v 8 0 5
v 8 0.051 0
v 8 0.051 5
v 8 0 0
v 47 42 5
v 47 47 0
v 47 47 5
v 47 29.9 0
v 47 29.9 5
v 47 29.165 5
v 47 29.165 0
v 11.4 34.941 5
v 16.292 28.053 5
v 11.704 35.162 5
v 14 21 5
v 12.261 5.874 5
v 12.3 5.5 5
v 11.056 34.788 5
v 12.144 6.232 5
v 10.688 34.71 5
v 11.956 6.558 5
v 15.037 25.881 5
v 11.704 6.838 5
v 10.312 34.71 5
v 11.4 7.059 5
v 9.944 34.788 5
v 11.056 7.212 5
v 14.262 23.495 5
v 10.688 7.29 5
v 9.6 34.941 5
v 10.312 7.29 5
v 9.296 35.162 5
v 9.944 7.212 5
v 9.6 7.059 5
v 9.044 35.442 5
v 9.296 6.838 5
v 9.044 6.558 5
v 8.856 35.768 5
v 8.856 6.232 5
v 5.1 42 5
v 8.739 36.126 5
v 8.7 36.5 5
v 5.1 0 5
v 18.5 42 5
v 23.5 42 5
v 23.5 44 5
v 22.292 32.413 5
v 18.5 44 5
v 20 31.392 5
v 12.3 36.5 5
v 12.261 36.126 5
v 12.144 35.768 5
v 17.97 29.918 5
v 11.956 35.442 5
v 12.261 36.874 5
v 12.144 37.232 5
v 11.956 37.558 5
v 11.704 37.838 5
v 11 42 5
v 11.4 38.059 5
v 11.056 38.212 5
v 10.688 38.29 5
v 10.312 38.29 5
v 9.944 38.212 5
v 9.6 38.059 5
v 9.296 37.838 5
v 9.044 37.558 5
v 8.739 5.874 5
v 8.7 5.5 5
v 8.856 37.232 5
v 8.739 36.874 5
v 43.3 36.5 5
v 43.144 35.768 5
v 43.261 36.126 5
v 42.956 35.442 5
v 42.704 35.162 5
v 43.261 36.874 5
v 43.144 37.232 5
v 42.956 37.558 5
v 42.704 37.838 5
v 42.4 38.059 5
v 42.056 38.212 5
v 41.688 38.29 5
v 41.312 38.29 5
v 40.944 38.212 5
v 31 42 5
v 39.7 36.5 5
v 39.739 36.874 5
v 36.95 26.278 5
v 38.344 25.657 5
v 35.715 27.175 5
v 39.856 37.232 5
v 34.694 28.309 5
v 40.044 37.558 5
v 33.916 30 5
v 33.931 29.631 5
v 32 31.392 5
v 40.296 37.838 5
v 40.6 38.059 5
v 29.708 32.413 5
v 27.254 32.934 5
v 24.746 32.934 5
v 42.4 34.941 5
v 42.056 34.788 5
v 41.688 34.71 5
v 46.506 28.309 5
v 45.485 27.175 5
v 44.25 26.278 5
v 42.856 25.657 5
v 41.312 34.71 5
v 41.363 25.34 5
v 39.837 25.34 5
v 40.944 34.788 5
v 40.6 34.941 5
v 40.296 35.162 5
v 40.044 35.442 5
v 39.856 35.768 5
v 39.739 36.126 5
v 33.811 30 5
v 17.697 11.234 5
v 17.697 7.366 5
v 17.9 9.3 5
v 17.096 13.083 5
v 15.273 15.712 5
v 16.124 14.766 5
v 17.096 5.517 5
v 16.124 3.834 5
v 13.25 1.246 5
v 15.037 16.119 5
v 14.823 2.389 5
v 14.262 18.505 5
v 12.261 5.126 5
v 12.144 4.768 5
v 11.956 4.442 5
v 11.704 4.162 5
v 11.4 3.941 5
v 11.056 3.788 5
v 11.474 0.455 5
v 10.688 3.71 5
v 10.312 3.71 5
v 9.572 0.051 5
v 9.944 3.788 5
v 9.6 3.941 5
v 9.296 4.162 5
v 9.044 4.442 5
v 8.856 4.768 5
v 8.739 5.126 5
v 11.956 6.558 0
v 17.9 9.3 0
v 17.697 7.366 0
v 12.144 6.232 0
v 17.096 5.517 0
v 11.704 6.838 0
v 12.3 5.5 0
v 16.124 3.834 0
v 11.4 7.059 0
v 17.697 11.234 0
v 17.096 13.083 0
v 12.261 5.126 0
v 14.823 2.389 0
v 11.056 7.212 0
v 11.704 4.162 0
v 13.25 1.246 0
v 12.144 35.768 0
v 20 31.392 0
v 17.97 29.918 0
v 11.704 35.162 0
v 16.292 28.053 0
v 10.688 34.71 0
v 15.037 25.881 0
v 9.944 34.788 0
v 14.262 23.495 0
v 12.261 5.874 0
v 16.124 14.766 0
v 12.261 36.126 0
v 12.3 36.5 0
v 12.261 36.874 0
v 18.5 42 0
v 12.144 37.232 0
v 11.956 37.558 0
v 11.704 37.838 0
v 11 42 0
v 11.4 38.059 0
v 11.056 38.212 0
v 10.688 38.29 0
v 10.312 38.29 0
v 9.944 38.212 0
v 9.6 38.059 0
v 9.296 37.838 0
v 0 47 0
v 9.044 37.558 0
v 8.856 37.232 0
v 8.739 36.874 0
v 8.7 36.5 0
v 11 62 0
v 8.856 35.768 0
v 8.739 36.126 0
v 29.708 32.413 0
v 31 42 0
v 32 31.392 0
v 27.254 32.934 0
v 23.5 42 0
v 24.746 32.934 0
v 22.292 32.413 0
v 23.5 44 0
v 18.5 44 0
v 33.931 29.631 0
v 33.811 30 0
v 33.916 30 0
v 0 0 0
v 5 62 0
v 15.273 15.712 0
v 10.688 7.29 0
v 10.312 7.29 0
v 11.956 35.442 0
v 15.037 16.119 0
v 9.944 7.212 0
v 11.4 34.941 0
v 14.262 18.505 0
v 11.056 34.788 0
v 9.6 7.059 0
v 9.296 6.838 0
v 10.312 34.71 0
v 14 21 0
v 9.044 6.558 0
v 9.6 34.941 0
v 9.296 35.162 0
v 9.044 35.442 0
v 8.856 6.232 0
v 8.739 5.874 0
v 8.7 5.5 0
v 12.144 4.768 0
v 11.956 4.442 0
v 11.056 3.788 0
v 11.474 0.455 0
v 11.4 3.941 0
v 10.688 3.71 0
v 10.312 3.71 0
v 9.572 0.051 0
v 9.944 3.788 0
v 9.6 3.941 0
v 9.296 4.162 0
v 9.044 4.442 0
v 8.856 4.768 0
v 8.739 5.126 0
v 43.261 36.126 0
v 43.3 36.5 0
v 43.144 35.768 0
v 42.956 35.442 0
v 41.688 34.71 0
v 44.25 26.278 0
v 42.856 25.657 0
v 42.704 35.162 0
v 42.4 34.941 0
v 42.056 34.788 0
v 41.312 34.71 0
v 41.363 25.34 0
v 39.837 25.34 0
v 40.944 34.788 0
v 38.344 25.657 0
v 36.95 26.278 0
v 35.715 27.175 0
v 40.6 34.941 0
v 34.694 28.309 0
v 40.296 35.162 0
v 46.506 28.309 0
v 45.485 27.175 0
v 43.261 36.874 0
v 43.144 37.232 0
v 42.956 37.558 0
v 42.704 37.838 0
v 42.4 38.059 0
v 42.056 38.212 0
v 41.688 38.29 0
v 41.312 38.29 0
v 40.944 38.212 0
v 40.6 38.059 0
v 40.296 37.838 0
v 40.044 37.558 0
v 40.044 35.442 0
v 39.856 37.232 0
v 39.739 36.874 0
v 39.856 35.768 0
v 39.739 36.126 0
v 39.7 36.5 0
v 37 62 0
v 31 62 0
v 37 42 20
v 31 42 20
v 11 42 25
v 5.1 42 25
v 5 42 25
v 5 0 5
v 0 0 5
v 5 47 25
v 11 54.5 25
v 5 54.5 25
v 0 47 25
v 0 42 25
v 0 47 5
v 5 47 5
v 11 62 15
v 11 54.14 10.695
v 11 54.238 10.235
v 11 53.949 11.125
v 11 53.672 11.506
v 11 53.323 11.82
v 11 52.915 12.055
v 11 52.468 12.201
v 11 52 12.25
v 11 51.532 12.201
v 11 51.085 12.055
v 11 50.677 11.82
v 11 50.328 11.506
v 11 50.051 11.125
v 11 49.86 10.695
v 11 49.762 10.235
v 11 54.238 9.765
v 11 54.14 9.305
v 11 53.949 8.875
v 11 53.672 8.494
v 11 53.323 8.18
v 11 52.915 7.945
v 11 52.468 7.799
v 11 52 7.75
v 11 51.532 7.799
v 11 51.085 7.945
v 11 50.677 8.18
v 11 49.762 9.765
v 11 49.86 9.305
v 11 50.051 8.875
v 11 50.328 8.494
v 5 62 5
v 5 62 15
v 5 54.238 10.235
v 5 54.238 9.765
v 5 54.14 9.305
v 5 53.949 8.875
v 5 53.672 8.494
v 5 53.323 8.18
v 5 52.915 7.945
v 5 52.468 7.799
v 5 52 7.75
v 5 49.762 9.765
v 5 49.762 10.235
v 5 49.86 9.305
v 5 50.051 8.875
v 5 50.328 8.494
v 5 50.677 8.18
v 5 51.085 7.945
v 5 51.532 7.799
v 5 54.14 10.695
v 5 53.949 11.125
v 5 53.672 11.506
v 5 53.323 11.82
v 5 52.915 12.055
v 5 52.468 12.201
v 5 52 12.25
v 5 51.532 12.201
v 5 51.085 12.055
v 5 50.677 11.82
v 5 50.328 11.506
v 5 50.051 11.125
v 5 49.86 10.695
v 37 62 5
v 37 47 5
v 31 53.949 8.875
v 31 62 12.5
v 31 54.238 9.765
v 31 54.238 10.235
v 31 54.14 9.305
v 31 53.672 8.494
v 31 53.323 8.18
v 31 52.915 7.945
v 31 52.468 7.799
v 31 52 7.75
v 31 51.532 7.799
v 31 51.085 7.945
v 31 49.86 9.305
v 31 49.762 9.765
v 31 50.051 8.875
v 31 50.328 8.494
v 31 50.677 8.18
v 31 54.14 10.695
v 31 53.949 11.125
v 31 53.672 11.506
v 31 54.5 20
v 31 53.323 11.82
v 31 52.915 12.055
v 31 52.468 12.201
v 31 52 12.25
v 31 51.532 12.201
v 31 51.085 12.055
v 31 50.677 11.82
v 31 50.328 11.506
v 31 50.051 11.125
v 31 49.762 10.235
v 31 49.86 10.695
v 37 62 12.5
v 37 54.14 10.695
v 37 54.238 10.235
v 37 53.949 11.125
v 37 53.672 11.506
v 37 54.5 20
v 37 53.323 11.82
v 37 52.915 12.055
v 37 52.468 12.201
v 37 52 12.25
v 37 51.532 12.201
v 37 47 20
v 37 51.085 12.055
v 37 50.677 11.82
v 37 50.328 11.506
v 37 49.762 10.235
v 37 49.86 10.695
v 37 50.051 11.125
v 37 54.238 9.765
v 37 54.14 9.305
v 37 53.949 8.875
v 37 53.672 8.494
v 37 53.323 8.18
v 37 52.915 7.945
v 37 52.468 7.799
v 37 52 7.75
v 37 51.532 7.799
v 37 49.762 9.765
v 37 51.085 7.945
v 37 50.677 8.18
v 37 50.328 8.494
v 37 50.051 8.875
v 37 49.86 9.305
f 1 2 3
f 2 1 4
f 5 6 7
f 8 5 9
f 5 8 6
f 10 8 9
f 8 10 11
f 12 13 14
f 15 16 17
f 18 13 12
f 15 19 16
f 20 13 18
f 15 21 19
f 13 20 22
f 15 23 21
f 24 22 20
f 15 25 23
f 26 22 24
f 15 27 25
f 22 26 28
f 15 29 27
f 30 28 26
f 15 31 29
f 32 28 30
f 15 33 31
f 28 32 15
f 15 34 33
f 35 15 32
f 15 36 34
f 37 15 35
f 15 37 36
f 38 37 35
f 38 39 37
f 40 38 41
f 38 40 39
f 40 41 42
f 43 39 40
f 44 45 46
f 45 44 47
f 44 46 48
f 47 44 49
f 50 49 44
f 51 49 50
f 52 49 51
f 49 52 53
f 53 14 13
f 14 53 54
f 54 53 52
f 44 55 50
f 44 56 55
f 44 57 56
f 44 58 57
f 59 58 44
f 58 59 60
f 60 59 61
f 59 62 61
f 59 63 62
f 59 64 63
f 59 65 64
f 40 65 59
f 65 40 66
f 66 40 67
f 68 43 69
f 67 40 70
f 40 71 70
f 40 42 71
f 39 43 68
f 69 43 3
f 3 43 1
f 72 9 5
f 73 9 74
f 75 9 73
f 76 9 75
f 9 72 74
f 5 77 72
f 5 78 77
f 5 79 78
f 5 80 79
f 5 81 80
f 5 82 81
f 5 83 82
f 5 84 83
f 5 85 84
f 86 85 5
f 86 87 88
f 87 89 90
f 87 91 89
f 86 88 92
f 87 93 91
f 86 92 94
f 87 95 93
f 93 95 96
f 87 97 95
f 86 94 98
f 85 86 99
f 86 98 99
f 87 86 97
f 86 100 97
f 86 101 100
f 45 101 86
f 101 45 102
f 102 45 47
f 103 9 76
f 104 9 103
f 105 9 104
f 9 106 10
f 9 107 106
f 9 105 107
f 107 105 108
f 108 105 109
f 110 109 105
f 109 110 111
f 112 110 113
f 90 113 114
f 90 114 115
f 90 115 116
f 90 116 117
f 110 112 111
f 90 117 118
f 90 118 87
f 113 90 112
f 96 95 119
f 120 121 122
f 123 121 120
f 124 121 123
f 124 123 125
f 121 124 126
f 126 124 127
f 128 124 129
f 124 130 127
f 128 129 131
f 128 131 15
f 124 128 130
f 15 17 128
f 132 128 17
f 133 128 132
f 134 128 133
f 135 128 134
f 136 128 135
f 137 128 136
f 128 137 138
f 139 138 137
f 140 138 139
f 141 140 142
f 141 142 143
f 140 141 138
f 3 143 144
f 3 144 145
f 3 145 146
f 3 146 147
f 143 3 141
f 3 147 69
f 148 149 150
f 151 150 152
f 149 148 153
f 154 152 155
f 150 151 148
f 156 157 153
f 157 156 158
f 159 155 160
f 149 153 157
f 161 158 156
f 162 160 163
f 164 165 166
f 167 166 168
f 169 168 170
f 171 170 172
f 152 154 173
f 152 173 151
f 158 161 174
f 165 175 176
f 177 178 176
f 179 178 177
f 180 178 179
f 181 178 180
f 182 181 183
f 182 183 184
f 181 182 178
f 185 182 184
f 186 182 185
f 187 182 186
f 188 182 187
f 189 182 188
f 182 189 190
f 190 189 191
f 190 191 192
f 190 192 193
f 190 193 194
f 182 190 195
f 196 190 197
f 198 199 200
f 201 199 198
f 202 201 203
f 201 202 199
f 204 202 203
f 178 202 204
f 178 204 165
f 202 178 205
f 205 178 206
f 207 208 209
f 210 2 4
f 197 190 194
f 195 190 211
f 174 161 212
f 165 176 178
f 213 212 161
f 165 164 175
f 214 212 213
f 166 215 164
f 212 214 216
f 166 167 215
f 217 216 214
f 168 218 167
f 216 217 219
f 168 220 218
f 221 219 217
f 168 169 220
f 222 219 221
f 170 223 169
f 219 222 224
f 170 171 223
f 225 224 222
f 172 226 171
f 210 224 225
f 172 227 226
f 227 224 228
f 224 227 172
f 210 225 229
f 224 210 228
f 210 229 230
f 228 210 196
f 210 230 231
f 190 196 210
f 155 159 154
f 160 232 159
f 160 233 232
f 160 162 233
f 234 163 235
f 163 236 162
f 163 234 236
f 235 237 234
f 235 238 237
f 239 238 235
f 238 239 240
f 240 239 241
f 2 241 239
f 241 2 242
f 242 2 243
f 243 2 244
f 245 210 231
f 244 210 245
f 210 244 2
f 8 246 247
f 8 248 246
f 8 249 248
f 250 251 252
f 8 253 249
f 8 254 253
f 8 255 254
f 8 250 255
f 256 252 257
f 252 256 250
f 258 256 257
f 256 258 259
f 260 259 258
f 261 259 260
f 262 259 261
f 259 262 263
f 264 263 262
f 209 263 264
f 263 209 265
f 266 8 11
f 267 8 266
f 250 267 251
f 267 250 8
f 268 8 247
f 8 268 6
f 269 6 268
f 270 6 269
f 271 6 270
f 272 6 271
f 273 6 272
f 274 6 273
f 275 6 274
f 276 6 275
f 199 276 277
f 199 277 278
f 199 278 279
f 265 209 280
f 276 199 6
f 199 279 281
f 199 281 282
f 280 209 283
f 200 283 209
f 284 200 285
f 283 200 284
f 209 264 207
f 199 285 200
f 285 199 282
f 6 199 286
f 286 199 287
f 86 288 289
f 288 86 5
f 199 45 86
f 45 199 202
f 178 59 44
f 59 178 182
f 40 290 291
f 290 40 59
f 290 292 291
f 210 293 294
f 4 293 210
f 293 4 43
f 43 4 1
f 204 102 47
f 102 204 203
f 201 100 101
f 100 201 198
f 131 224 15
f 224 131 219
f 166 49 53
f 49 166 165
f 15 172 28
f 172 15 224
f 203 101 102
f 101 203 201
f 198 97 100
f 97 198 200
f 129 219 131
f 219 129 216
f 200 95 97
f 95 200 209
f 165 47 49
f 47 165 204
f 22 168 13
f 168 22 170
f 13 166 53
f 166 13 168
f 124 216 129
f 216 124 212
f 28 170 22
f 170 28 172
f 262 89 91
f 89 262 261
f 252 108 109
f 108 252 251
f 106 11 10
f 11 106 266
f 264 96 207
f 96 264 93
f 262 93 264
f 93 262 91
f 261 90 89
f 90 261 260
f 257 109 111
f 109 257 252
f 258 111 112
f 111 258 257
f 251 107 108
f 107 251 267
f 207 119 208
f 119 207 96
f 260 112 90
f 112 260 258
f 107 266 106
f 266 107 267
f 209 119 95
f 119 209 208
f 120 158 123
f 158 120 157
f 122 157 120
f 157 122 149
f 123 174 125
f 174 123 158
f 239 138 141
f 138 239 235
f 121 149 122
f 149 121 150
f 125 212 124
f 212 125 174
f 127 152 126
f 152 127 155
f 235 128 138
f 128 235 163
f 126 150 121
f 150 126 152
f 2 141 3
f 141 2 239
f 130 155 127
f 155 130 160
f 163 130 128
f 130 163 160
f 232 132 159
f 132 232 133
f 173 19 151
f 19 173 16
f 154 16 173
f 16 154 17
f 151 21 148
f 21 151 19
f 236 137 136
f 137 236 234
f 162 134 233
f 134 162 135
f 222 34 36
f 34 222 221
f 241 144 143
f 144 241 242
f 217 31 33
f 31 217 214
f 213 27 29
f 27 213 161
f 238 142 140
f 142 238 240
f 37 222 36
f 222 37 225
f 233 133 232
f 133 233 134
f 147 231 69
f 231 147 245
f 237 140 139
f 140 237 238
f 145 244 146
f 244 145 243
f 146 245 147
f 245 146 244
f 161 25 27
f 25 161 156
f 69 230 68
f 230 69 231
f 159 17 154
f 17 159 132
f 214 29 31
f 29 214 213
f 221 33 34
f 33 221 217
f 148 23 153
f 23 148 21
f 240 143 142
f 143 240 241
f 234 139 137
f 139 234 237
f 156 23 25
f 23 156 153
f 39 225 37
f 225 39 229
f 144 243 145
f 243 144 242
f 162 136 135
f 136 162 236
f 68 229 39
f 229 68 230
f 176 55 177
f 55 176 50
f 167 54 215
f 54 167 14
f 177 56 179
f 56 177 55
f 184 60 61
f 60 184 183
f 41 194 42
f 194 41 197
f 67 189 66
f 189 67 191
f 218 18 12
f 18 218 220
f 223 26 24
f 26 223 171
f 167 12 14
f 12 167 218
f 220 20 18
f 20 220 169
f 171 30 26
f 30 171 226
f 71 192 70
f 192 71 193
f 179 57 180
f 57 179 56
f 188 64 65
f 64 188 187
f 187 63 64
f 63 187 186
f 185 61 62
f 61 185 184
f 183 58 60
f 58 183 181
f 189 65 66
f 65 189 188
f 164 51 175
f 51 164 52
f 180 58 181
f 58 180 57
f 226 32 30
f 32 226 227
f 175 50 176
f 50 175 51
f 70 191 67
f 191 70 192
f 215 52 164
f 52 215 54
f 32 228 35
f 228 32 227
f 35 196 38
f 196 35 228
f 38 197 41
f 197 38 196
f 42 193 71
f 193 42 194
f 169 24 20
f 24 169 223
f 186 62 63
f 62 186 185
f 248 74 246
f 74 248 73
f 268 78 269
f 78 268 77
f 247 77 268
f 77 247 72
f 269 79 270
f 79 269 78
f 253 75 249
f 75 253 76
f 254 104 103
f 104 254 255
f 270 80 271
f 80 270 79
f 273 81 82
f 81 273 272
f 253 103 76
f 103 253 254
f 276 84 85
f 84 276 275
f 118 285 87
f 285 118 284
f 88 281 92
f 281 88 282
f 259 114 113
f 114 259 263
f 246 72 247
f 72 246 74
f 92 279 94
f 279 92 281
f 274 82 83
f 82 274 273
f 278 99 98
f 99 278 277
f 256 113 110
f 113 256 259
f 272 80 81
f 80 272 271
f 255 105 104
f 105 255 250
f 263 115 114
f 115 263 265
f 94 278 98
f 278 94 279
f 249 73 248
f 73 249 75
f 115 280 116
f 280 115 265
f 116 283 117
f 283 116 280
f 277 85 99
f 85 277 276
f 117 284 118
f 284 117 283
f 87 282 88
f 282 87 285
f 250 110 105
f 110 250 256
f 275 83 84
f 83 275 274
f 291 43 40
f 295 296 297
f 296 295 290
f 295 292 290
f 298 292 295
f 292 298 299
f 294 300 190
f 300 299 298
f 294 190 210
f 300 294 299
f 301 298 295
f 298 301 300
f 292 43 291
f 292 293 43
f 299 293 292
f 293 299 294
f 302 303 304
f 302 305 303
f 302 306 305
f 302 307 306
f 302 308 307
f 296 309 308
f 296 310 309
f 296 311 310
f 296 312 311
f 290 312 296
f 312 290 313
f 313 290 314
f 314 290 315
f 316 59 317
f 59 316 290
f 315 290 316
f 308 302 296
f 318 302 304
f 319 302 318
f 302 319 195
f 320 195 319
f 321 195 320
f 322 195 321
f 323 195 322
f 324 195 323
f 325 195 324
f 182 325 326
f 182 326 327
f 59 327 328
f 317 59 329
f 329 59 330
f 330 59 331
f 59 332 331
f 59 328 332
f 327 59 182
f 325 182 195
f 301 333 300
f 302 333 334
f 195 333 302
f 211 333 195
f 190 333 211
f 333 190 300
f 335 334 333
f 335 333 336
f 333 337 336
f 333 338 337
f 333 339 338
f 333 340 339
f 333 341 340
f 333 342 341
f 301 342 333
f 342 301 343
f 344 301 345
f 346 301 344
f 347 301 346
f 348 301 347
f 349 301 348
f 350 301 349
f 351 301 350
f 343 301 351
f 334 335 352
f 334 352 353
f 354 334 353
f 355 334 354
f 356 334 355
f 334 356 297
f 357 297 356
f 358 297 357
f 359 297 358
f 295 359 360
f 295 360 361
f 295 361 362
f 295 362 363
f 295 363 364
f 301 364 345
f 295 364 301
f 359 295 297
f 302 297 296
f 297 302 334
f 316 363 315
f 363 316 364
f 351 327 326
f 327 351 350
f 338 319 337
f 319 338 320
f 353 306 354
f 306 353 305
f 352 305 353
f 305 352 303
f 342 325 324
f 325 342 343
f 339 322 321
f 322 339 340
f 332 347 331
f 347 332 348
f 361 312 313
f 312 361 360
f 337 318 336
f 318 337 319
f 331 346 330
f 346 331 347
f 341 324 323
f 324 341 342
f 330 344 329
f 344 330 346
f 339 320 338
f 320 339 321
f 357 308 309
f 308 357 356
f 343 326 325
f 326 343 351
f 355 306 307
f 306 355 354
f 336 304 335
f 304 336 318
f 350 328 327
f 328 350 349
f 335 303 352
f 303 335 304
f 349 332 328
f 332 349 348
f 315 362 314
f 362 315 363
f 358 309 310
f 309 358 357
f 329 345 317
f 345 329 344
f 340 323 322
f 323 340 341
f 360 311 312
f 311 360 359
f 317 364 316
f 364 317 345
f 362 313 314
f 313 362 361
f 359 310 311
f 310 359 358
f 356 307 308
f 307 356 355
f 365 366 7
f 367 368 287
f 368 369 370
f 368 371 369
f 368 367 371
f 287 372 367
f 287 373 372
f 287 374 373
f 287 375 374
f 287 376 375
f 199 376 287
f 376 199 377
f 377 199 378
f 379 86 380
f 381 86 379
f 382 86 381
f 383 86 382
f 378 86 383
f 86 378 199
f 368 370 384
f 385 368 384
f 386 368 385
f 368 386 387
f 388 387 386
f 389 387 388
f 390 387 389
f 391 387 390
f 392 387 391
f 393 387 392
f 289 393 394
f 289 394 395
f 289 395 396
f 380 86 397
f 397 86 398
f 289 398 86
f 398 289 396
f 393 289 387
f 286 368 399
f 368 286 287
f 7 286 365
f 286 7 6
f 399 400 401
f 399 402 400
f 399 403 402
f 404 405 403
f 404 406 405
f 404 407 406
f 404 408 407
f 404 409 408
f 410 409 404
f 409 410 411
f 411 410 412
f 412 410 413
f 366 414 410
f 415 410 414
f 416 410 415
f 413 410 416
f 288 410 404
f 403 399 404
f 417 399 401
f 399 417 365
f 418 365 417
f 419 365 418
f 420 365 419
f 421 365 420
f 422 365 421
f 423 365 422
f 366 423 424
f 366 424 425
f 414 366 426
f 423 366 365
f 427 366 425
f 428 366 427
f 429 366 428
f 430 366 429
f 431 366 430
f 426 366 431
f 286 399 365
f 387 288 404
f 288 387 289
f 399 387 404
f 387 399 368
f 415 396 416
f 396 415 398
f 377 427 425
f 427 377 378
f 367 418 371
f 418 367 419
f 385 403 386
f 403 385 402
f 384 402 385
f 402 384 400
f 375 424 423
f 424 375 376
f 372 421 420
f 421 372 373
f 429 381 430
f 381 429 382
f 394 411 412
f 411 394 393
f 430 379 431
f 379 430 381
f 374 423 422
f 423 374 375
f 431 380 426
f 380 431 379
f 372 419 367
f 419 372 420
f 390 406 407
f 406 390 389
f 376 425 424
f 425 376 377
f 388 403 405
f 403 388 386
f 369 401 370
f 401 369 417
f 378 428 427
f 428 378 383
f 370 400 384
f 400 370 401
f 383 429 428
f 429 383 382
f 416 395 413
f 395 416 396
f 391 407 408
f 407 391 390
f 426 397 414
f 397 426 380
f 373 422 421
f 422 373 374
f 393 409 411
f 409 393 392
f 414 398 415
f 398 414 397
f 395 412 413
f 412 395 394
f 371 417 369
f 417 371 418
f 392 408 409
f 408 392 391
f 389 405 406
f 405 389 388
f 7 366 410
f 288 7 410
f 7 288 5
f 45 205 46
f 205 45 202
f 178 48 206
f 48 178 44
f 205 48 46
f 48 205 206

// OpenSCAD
// file: metric.scad
// PRUSA Mendel  
// Default metric sizes
// GNU GPL v2
// Josef Průša
// josefprusa@me.com
// prusadjs.cz
// http://www.reprap.org/wiki/Prusa_Mendel
// http://github.com/prusajr/PrusaMendel

// DONT CHANGE THIS FILE! ALTER VALUES IN CONFIGURATION.SCAD INSTEAD

// RODS

threaded_rod_diameter = 8.2;
threaded_rod_diameter_horizontal = 8.2;
smooth_bar_diameter = 8;
smooth_bar_diameter_horizontal = 8.5;

// Nuts and bolts

m8_diameter = 9;
m8_nut_diameter = 16.4;

m4_diameter = 4.5;
m4_nut_diameter = 9;

m3_diameter = 3.6;
m3_nut_diameter = 6.1;

// Bushing holder

bushing_core_diameter = smooth_bar_diameter;
bushing_material_thickness = 1;

// Motors

motor_shaft = 5.5;
// main file
// C. Strang		
// cstrang@????
// funfor.us

h = 5;   	// base thickness
hh=6;
o = 0.1;	//  overlap amount
w=2.5;			// wall thickness
fmp = false;	// four mount points
st=2;

//import("Y Motor Bracket.stl");

include <metric.scad>;

m3=m3_diameter ; 
m4=m4_diameter ; 
m8=smooth_bar_diameter_horizontal;

$fn=30;

translate([0,0,0]) ymotormount();

module ymotormount()
{
	translate([5,0,0]) nema17motormount(h,fmp);
	translate([0,0,0]) rotate([0,0,0]) walls();
}


module nema17motormount(pt,mp)
{
	difference()
	{
		union()
		{
			difference()
			{
				translate([0,0,0]) rotate([0,0,0]) cube([42,42,pt]);
		
				translate([21,21,-0.1]) cylinder(r=12,h=pt+2*o);
				if (mp==false)
				{
					translate([28,-0.1,-o])  cube([25,30,21]);
					translate([3,-0.1,-o])  cube([36,15,21]);
				}
		
			}
			
			if (mp==false) difference()
			{
				translate([35.6,32.6,0]) cylinder(r=7.3,h=pt);
				translate([42,28,-o]) cube([5,10,pt+2*o]);
				translate([28,30,-o]) cube([17,10,pt+2*o]);
			}
		
			if (mp==false) translate([1,0,0]) difference()
			{
				translate([2.6,9.3,0]) cylinder(r=9.3,h=pt);
				translate([-8,0,-o]) cube([7,20,pt+2*o]);
			}
		}
		translate([5.5,5.5,-o]) cylinder(r=m3/2,h=pt+2*o);
		translate([5.5,36.5,-o]) cylinder(r=m3/2,h=pt+2*o);
		translate([36.5,36.5,-o]) cylinder(r=m3/2,h=pt+2*o);
		if (mp==true)
		{
			translate([36.5,5.5,-o]) cylinder(r=m3/2,h=pt+2*o);
	
		}
	}
}


module walls()
{
	difference()
	{
			translate([0,0,0]) rotate([0,0,0]) cube([h+o,47,25]);
			translate([-o,0,h]) rotate([atan(20/42),0,0]) cube([h+3*o,47,25]);
	}
	difference()
	{
			translate([0,42,0]) rotate([0,0,0]) cube([11,20,h]);
			translate([0,47,-o]) rotate([0,0,-atan(5/15)]) mirror([1,0,0]) cube([10,20,h+3*o]);
	}
	difference()
	{
			translate([h,42,0]) rotate([0,0,0]) cube([hh,20,25]);
			translate([h-o,62,15]) rotate([atan(7.5/10),0,0]) cube([hh+2*o,20,25]);
			translate([h-o,52,10]) rotate([0,90,0]) cylinder(r=m4/2,h=hh+2*o);
	}

	difference()
	{
			translate([31,42,0]) rotate([0,0,0]) cube([16,20,h]);
			translate([47,47,-o]) rotate([0,0,atan(10/15)]) mirror([0,0,0]) cube([10,20,h+3*o]);
	}
	difference()
	{
			translate([31,42,0]) rotate([0,0,0]) cube([hh,20,20]);
			translate([31-o,62,12.5]) rotate([atan(7.5/7.5),0,0]) cube([hh+2*o,20,25]);
			translate([31-o,52,10]) rotate([0,90,0]) cylinder(r=m4/2,h=hh+2*o);
	}
	difference()
	{
			translate([31,42,0]) rotate([0,0,0]) cube([16,h,20]);
			translate([47,42-o,h]) rotate([0,-atan(10/15),0]) mirror([0,0,0]) cube([16,h+3*o,20]);
	}

	translate([18.5,42,0]) rotate([0,0,0]) cube([5,st,h]);



}
